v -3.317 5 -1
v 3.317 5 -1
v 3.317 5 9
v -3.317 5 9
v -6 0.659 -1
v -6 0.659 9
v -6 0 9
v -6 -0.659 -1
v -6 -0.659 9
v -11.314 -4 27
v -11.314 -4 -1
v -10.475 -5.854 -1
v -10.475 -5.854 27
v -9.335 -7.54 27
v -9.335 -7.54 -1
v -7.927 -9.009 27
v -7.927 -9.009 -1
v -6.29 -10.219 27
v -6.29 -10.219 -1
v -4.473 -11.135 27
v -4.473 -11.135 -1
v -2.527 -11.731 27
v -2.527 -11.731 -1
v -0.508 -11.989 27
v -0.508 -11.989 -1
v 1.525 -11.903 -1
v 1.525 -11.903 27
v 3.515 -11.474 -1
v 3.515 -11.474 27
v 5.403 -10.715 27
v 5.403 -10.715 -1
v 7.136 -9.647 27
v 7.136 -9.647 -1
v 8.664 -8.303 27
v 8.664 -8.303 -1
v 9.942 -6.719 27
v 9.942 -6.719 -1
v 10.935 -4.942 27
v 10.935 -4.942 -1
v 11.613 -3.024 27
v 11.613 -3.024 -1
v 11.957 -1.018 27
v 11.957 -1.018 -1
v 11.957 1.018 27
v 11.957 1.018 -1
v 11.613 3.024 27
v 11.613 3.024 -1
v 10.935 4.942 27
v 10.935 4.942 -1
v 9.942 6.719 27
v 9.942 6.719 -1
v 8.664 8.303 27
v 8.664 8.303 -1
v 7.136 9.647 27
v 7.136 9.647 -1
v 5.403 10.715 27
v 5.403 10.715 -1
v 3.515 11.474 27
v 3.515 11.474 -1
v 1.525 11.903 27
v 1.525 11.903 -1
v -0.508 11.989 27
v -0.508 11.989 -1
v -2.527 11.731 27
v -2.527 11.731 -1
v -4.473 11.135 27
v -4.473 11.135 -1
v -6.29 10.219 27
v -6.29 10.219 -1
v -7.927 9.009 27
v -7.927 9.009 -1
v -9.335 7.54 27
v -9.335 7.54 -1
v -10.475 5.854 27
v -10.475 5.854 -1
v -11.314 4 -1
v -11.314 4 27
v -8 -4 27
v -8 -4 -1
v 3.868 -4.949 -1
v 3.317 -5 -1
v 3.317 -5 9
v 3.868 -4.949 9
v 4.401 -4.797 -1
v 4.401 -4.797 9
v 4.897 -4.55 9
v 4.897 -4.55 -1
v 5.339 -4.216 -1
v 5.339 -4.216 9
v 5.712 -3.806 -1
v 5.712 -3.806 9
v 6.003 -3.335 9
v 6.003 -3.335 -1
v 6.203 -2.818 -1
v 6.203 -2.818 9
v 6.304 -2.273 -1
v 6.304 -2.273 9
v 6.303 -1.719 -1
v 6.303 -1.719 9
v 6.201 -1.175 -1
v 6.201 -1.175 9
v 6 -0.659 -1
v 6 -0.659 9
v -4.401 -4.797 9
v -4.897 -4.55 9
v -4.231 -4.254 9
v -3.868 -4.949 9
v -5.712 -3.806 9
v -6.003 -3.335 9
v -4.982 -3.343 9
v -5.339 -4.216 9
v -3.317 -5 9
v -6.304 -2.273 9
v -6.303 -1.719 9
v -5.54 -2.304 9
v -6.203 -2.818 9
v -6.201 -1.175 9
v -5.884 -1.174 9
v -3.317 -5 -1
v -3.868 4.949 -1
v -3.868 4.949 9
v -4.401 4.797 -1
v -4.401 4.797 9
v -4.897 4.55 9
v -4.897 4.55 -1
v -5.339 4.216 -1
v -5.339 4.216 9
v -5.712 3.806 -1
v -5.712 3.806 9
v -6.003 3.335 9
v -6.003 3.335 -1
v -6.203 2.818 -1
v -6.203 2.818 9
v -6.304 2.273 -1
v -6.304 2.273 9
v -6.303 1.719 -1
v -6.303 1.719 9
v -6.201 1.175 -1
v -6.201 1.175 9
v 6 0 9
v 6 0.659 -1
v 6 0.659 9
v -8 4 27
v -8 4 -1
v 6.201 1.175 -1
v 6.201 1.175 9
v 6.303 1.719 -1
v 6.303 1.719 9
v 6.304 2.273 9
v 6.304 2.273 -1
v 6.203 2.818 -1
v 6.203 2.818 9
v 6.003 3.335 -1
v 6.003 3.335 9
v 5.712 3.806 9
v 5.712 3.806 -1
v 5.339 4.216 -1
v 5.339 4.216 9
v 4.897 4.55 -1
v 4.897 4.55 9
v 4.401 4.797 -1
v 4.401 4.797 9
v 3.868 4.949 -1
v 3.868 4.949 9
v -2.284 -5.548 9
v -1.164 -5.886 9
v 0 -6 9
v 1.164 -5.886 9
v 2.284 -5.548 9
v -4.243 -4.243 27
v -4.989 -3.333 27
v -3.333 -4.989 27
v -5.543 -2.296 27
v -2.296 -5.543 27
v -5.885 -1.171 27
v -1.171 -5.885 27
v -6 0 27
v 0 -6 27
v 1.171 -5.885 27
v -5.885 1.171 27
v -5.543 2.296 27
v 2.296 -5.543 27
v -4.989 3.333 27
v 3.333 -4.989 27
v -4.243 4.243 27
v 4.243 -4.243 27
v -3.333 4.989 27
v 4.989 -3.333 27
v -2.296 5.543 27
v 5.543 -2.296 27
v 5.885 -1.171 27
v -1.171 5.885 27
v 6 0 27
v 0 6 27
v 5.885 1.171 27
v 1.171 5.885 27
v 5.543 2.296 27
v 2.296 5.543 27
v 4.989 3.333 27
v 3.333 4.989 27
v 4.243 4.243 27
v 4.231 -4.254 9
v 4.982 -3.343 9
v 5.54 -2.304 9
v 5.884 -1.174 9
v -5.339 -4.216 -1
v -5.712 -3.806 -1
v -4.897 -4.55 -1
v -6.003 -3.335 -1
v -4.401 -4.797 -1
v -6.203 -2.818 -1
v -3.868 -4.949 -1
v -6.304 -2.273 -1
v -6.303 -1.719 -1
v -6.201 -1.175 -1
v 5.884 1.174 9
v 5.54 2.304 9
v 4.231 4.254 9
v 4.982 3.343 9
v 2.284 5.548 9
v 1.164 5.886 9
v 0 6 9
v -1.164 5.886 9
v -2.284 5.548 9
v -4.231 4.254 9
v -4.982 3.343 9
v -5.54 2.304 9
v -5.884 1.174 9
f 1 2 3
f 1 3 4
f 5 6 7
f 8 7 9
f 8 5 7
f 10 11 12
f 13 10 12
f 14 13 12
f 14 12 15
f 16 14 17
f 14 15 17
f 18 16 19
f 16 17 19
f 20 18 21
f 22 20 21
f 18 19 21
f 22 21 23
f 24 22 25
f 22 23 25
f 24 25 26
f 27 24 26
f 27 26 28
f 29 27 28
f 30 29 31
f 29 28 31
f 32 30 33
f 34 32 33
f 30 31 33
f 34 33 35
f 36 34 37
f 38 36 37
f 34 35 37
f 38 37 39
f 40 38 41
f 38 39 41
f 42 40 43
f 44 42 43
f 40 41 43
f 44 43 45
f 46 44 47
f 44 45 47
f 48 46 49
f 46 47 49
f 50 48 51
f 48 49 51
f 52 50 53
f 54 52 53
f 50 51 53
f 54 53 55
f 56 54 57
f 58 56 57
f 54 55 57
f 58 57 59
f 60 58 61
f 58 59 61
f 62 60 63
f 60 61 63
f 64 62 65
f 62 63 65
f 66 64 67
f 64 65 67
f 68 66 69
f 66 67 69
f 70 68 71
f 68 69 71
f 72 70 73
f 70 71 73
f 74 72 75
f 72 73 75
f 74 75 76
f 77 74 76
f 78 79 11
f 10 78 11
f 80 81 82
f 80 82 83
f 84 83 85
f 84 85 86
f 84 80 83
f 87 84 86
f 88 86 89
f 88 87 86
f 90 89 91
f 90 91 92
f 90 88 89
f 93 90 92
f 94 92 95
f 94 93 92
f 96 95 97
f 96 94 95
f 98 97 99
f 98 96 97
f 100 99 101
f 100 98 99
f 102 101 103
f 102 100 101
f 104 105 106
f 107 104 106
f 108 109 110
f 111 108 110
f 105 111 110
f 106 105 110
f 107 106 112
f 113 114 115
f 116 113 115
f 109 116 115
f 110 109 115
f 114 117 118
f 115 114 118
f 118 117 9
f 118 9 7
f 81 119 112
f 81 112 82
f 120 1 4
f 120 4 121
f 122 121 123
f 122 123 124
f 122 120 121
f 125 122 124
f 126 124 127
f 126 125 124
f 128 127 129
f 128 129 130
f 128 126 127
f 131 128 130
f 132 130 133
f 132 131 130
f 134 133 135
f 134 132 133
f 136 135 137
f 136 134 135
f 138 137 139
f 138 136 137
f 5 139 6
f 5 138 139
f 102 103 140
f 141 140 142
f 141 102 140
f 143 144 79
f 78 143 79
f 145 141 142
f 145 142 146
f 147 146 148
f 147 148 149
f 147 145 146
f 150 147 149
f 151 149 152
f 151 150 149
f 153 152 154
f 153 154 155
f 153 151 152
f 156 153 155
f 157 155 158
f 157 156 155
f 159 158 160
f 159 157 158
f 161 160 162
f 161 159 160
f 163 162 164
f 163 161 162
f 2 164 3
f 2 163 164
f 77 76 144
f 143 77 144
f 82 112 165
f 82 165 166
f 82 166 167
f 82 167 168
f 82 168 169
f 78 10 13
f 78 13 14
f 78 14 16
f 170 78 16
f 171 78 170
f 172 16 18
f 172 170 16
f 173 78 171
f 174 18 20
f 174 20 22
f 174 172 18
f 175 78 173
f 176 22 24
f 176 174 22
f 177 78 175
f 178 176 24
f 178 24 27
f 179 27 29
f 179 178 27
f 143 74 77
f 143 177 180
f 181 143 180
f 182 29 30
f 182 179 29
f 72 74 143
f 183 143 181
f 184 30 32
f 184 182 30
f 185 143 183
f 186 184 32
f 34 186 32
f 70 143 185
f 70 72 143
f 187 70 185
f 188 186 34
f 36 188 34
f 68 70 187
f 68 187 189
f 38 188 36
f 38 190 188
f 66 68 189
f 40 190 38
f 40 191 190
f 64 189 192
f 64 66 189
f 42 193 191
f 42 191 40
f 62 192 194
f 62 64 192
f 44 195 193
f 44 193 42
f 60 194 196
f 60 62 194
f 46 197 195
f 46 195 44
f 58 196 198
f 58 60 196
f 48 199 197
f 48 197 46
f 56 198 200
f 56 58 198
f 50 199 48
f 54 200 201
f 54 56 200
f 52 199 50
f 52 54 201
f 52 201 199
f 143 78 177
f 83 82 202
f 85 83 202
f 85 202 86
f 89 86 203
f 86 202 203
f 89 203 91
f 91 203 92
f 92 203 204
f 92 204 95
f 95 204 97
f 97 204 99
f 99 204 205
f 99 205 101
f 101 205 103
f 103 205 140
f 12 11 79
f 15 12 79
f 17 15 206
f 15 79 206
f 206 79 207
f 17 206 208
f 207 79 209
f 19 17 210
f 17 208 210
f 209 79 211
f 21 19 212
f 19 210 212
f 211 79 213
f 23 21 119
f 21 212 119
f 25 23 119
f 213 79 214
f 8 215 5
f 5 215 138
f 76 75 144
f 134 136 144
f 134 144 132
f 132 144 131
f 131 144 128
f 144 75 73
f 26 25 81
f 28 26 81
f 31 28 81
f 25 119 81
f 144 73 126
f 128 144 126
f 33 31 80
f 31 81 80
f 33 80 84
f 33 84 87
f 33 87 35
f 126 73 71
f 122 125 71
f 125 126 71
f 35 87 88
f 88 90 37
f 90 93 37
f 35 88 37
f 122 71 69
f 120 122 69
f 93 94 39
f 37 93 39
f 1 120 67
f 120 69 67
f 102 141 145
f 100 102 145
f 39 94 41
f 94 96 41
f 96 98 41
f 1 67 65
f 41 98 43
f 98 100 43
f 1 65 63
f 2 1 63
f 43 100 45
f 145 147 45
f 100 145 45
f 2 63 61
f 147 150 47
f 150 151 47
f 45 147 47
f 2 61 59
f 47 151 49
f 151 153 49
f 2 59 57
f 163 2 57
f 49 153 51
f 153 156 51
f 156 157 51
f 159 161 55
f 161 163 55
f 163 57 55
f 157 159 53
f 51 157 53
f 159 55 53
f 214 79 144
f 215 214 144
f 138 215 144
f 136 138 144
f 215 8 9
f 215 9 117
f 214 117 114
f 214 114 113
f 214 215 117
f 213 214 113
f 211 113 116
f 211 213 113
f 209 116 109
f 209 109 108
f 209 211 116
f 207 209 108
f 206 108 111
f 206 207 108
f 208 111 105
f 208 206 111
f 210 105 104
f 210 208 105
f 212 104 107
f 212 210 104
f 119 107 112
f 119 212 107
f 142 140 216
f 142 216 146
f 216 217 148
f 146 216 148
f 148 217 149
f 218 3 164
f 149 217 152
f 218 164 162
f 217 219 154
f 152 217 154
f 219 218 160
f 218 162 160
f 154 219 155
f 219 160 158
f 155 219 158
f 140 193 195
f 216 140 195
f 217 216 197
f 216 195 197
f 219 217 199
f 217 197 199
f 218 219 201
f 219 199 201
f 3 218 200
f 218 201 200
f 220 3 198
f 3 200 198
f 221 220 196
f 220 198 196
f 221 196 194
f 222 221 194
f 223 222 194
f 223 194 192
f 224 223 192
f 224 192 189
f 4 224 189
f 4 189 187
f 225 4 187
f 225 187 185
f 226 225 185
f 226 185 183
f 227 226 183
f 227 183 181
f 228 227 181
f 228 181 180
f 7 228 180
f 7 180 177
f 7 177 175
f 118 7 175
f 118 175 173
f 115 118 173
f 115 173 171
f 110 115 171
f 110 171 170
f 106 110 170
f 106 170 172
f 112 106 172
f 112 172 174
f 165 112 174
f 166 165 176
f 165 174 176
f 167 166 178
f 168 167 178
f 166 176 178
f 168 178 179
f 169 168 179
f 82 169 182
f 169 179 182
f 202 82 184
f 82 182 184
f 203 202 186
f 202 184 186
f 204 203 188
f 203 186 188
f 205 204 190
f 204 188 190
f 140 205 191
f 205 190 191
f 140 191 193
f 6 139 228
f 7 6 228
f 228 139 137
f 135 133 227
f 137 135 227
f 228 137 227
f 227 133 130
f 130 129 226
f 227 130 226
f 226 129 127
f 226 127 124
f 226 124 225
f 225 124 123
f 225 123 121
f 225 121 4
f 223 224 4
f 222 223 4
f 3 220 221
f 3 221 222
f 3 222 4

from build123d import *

# Parameters (mm, degrees)
EXTRUDE_1_DEPTH     = 28
CUT_EXTRUDE_1_DEPTH = 10
SKETCH_3_R          = 6
CUT_EXTRUDE_2_DEPTH = 18


with BuildPart() as part:
    # Эскиз1 → Бобышка-Вытянуть1 (new body)
    with BuildSketch(Plane(origin=(0, 0, -1), x_dir=(-1, 0, 0), z_dir=(0, 0, -1))):
        with BuildLine():
            Line((11.313708499, 4), (8, 4))
            Line((8, 4), (8, -4))
            Line((8, -4), (11.313708499, -4))
            ThreePointArc((11.313708499, -4), (-12, 0), (11.313708499, 4))
        make_face()
    extrude(amount=-EXTRUDE_1_DEPTH)

    # Эскиз2 → Вырез-Вытянуть1 (cut)
    with BuildSketch(Plane(origin=(0, 0, -1), x_dir=(-1, 0, 0), z_dir=(0, 0, -1))):
        with BuildLine():
            Line((-3.31662479, 5), (3.31662479, 5))
            ThreePointArc((3.31662479, 5), (5.868522172, 3.577282395), (6, 0.658546503))
            Line((6, 0.658546503), (6, -0.658546503))
            ThreePointArc((6, -0.658546503), (5.868522172, -3.577282395), (3.31662479, -5))
            Line((3.31662479, -5), (-3.31662479, -5))
            ThreePointArc((-3.31662479, -5), (-5.868522172, -3.577282395), (-6, -0.658546503))
            Line((-6, -0.658546503), (-6, 0.658546503))
            ThreePointArc((-6, 0.658546503), (-5.868522172, 3.577282395), (-3.31662479, 5))
        make_face()
    extrude(amount=-CUT_EXTRUDE_1_DEPTH, mode=Mode.SUBTRACT)

    # Эскиз3 → Вырез-Вытянуть2 (cut)
    with BuildSketch(Plane.XY.offset(27)):
        Circle(SKETCH_3_R)
    extrude(amount=-CUT_EXTRUDE_2_DEPTH, mode=Mode.SUBTRACT)


solid = part.part
